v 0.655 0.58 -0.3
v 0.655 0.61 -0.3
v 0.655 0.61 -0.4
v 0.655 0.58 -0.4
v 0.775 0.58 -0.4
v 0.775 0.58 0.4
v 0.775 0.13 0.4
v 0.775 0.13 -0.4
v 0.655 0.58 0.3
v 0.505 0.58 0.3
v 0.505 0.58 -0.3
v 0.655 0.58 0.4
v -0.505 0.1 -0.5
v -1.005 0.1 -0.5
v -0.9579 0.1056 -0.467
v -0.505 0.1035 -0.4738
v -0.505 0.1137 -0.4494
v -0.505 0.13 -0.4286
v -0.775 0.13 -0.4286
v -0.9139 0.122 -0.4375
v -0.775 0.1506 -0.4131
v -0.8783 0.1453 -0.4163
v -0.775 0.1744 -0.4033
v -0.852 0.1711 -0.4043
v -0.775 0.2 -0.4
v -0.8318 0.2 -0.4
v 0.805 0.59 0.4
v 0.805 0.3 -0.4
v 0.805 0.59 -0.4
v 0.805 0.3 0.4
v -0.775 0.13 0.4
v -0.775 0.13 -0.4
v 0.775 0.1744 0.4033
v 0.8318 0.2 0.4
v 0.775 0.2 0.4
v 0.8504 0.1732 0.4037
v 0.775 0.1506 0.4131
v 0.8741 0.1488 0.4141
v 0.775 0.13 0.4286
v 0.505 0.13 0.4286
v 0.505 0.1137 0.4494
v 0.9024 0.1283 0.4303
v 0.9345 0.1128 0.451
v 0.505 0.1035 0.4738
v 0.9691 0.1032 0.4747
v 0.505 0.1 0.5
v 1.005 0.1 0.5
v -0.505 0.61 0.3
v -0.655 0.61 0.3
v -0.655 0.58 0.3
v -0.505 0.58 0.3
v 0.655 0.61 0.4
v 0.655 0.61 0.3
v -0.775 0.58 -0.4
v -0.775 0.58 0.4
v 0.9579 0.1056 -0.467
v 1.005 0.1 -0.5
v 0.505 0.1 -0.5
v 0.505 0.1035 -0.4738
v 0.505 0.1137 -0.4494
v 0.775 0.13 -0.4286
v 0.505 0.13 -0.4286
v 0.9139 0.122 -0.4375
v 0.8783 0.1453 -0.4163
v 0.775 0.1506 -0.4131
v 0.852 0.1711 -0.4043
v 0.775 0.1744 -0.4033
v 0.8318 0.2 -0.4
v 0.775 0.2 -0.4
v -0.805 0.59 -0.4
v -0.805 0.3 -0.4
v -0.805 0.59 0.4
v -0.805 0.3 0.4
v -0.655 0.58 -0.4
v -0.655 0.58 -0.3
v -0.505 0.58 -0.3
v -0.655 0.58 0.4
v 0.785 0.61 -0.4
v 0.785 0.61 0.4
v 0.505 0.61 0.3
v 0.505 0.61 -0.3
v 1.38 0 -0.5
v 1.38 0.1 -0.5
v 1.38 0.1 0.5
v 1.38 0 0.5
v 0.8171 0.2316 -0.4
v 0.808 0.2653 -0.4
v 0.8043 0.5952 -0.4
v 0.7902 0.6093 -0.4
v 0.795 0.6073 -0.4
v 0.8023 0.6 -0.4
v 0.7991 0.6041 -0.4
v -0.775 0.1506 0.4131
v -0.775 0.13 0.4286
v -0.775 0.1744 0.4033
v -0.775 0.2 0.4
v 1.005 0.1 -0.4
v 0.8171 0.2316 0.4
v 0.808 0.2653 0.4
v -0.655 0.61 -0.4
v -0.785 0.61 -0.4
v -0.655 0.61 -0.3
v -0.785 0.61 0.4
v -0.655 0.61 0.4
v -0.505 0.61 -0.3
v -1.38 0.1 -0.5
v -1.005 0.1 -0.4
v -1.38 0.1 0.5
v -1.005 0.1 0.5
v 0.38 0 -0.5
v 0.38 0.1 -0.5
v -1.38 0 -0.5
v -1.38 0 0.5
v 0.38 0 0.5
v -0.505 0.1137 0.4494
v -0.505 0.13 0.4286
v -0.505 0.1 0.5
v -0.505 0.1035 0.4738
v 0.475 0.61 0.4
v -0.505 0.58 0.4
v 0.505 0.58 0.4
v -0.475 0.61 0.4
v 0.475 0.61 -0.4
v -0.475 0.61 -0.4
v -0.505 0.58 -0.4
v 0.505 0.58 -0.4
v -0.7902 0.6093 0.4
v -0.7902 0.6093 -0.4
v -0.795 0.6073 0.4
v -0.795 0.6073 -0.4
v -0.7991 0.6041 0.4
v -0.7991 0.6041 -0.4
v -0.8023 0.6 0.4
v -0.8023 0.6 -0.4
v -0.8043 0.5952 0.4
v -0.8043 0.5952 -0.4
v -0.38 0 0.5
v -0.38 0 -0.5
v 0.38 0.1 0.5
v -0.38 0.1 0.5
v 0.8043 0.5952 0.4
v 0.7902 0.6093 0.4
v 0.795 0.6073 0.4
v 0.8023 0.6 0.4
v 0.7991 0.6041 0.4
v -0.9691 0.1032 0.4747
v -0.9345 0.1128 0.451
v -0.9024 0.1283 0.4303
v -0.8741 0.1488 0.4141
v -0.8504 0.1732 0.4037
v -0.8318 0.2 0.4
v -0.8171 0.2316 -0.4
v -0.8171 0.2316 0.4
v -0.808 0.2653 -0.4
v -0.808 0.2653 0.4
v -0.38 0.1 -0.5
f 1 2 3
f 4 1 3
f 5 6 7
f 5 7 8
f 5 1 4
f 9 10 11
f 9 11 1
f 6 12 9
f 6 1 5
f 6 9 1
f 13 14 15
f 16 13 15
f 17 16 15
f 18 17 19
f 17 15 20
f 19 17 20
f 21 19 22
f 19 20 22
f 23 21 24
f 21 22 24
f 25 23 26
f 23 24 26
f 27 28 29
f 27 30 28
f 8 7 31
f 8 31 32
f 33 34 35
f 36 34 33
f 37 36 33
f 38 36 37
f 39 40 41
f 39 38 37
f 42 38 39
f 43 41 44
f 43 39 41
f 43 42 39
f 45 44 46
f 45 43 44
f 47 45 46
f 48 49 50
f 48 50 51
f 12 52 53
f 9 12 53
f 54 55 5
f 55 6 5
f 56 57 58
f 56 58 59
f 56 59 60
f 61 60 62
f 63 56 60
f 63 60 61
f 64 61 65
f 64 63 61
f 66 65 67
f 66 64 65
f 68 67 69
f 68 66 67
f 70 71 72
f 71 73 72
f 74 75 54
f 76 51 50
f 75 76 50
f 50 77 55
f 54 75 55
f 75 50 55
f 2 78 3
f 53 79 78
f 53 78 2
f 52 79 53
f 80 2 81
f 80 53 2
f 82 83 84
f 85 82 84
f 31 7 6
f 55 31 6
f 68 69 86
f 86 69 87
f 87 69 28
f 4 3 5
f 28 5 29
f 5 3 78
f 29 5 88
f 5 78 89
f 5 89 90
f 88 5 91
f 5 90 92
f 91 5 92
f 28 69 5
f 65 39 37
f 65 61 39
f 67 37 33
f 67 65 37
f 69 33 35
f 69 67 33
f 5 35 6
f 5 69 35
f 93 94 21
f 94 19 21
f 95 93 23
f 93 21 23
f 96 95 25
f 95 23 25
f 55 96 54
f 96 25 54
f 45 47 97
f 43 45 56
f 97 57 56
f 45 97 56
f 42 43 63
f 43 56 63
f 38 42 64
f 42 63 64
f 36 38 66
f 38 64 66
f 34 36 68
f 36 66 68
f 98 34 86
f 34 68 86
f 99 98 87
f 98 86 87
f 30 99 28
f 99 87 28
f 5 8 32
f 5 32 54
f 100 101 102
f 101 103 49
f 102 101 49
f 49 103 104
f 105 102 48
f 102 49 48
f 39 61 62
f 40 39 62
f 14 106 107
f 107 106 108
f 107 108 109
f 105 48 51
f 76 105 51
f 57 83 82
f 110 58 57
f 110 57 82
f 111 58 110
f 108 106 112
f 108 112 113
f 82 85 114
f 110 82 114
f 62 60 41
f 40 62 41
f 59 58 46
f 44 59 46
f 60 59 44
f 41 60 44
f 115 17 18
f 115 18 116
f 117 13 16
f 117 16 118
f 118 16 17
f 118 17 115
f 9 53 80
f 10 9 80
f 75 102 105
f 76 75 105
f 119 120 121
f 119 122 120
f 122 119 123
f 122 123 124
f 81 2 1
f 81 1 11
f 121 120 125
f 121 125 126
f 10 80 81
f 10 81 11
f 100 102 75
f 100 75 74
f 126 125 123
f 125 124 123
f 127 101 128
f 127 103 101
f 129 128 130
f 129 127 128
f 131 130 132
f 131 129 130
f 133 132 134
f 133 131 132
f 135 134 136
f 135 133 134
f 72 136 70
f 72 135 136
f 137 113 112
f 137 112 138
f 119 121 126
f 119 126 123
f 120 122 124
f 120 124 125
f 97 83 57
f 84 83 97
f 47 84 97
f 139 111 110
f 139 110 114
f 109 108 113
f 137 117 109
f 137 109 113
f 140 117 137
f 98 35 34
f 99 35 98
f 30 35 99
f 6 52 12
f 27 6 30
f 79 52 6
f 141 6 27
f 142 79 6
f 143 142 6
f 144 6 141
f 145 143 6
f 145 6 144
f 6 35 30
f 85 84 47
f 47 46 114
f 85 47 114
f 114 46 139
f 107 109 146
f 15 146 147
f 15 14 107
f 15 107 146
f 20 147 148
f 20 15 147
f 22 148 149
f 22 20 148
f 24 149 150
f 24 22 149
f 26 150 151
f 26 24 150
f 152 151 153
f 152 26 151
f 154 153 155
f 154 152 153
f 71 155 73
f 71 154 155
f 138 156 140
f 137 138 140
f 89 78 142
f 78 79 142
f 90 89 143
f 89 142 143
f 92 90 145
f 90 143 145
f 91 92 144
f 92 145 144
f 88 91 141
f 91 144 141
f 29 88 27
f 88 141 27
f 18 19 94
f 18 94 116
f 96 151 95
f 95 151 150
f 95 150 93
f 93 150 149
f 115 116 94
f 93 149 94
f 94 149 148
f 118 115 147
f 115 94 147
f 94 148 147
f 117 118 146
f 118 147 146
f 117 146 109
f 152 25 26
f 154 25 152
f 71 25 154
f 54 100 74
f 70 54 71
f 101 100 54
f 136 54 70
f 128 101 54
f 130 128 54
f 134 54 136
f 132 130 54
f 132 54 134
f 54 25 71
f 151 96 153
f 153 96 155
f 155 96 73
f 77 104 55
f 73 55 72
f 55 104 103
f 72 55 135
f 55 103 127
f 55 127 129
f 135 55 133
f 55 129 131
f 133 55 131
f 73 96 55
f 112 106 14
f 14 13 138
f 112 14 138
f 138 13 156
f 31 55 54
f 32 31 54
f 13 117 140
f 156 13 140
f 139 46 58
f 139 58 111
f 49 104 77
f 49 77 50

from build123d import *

# Parameters (mm, degrees)
SKETCH1_W           = 0.8
SKETCH1_H           = 0.45
BOSS_EXTRUDE1_DEPTH = 0.775
BOSS_EXTRUDE2_DEPTH = 0.4
FILLET1_R           = 0.02
SKETCH3_W           = 0.15
SKETCH3_H           = 0.1
CUT_EXTRUDE1_DEPTH  = 0.03
SKETCH6_W           = 1
SKETCH6_H           = 1
BOSS_EXTRUDE5_DEPTH = 0.1
FILLET2_R           = 0.2
FILLET3_START       = -0.862971281
FILLET3_DEPTH       = 0.087971281
FILLET3_START_2     = -0.8049999
FILLET3_2_DEPTH     = 0.2999999
FILLET3_START_3     = -1.0050001
FILLET3_3_DEPTH     = 0.142028819
FILLET3_START_4     = -2
FILLET3_4_OUTLINE_W = 0.27
FILLET3_4_OUTLINE_H = 0.07
FILLET3_4_DEPTH     = 3
BOSS_EXTRUDE6_DEPTH = 0.8


with BuildPart() as part:
    # Sketch1 → Boss-Extrude1 (new, symmetric)
    with BuildSketch(Plane(origin=(0, 0, 0), x_dir=(0, 0, -1), z_dir=(1, 0, 0))):
        with Locations((0, 0.355)):
            Rectangle(SKETCH1_W, SKETCH1_H)
    extrude(amount=BOSS_EXTRUDE1_DEPTH, both=True)


with BuildPart() as body_2:
    # Sketch2 → Boss-Extrude2 (new, symmetric)
    with BuildSketch(Plane.XY):
        Polygon((-0.505, 0.58), (-0.775, 0.58), (-0.775, 0.13), (-0.505, 0.13), (-0.505, 0.1), (-0.805, 0.1), (-0.805, 0.61), (-0.505, 0.61), align=None)
    extrude(amount=BOSS_EXTRUDE2_DEPTH, both=True)

    # Fillet1
    fillet1_edges = [body_2.edges().sort_by_distance(p)[0] for p in [
        (-0.805, 0.61, 0),
    ]]
    fillet(fillet1_edges, radius=FILLET1_R)

    # Sketch3 → Cut-Extrude1 (cut)
    with BuildSketch(Plane(origin=(0, 0.61, 0), x_dir=(1, 0, 0), z_dir=(0, 1, 0))):
        with Locations((-0.58, 0.35)):
            Rectangle(SKETCH3_W, SKETCH3_H)
        with Locations((-0.58, -0.35)):
            Rectangle(SKETCH3_W, SKETCH3_H)
    extrude(amount=-CUT_EXTRUDE1_DEPTH, mode=Mode.SUBTRACT)

    # Sketch6 → Boss-Extrude5 (add)
    with BuildSketch(Plane.XZ.offset(-0.1)):
        with Locations((-0.88, 0)):
            Rectangle(SKETCH6_W, SKETCH6_H)
    extrude(amount=BOSS_EXTRUDE5_DEPTH)

    # Fillet2
    fillet2_edges = [body_2.edges().sort_by_distance(p)[0] for p in [
        (-0.805, 0.1, 0),
    ]]
    fillet(fillet2_edges, radius=FILLET2_R)

    # Fillet3: read off the stored shape, not the designer's step
    # Fillet3 outline → Fillet3 (add)
    with BuildSketch(Plane.YZ.offset(FILLET3_START)):
        with BuildLine():
            Line((0.1, 0.5), (0.1, 0.4))
            Line((0.1, 0.4), (0.2, 0.4))
            ThreePointArc((0.2, 0.4), (0.129289322, 0.429289322), (0.1, 0.5))
        make_face()
        with BuildLine():
            ThreePointArc((0.1, -0.5), (0.129289322, -0.429289322), (0.2, -0.4))
            Line((0.2, -0.4), (0.1, -0.4))
            Line((0.1, -0.4), (0.1, -0.5))
        make_face()
    extrude(amount=FILLET3_DEPTH)

    # Fillet3 2 outline → Fillet3 2 (add)
    with BuildSketch(Plane.YZ.offset(FILLET3_START_2)):
        with BuildLine():
            Line((0.1, 0.5), (0.1, 0.4))
            Line((0.1, 0.4), (0.2, 0.4))
            ThreePointArc((0.2, 0.4), (0.129289322, 0.429289322), (0.1, 0.5))
        make_face()
        with BuildLine():
            ThreePointArc((0.1, -0.5), (0.129289322, -0.429289322), (0.2, -0.4))
            Line((0.2, -0.4), (0.1, -0.4))
            Line((0.1, -0.4), (0.1, -0.5))
        make_face()
    extrude(amount=FILLET3_2_DEPTH)

    # Fillet3 3 outline → Fillet3 3 (add)
    with BuildSketch(Plane.YZ.offset(FILLET3_START_3)):
        with BuildLine():
            Line((0.1, 0.5), (0.1, 0.4))
            Line((0.1, 0.4), (0.2, 0.4))
            ThreePointArc((0.2, 0.4), (0.129289322, 0.429289322), (0.1, 0.5))
        make_face()
        with BuildLine():
            ThreePointArc((0.1, -0.5), (0.129289322, -0.429289322), (0.2, -0.4))
            Line((0.2, -0.4), (0.1, -0.4))
            Line((0.1, -0.4), (0.1, -0.5))
        make_face()
    extrude(amount=FILLET3_3_DEPTH)

    # Fillet3 4 outline → Fillet3 4 (cut)
    with BuildSketch(Plane.XY.offset(FILLET3_START_4)):
        with BuildLine():
            Line((-1.0050001, 0.2), (-1.00500005, 0.1))
            ThreePointArc((-1.00500005, 0.1), (-0.905000022, 0.126794907), (-0.831794919, 0.2))
            Line((-0.831794919, 0.2), (-1.0050001, 0.2))
        make_face()
        with Locations((-0.64, 0.165)):
            Rectangle(FILLET3_4_OUTLINE_W, FILLET3_4_OUTLINE_H)
    extrude(amount=FILLET3_4_DEPTH, mode=Mode.SUBTRACT)


with BuildPart() as body_3:
    # Mirror2: mirrored copy
    add(body_2.part.mirror(Plane(origin=(0, 0, 0), x_dir=(0, 0, 1), z_dir=(1, 0, 0))))


with BuildPart() as body_4:
    # Sketch7 → Boss-Extrude6 (new body)
    with BuildSketch(Plane.XY.offset(0.4)):
        Polygon((-0.505, 0.58), (0.505, 0.58), (0.475, 0.61), (-0.475, 0.61), align=None)
    extrude(amount=-BOSS_EXTRUDE6_DEPTH)


solid = Compound([part.part, body_2.part, body_3.part, body_4.part])
